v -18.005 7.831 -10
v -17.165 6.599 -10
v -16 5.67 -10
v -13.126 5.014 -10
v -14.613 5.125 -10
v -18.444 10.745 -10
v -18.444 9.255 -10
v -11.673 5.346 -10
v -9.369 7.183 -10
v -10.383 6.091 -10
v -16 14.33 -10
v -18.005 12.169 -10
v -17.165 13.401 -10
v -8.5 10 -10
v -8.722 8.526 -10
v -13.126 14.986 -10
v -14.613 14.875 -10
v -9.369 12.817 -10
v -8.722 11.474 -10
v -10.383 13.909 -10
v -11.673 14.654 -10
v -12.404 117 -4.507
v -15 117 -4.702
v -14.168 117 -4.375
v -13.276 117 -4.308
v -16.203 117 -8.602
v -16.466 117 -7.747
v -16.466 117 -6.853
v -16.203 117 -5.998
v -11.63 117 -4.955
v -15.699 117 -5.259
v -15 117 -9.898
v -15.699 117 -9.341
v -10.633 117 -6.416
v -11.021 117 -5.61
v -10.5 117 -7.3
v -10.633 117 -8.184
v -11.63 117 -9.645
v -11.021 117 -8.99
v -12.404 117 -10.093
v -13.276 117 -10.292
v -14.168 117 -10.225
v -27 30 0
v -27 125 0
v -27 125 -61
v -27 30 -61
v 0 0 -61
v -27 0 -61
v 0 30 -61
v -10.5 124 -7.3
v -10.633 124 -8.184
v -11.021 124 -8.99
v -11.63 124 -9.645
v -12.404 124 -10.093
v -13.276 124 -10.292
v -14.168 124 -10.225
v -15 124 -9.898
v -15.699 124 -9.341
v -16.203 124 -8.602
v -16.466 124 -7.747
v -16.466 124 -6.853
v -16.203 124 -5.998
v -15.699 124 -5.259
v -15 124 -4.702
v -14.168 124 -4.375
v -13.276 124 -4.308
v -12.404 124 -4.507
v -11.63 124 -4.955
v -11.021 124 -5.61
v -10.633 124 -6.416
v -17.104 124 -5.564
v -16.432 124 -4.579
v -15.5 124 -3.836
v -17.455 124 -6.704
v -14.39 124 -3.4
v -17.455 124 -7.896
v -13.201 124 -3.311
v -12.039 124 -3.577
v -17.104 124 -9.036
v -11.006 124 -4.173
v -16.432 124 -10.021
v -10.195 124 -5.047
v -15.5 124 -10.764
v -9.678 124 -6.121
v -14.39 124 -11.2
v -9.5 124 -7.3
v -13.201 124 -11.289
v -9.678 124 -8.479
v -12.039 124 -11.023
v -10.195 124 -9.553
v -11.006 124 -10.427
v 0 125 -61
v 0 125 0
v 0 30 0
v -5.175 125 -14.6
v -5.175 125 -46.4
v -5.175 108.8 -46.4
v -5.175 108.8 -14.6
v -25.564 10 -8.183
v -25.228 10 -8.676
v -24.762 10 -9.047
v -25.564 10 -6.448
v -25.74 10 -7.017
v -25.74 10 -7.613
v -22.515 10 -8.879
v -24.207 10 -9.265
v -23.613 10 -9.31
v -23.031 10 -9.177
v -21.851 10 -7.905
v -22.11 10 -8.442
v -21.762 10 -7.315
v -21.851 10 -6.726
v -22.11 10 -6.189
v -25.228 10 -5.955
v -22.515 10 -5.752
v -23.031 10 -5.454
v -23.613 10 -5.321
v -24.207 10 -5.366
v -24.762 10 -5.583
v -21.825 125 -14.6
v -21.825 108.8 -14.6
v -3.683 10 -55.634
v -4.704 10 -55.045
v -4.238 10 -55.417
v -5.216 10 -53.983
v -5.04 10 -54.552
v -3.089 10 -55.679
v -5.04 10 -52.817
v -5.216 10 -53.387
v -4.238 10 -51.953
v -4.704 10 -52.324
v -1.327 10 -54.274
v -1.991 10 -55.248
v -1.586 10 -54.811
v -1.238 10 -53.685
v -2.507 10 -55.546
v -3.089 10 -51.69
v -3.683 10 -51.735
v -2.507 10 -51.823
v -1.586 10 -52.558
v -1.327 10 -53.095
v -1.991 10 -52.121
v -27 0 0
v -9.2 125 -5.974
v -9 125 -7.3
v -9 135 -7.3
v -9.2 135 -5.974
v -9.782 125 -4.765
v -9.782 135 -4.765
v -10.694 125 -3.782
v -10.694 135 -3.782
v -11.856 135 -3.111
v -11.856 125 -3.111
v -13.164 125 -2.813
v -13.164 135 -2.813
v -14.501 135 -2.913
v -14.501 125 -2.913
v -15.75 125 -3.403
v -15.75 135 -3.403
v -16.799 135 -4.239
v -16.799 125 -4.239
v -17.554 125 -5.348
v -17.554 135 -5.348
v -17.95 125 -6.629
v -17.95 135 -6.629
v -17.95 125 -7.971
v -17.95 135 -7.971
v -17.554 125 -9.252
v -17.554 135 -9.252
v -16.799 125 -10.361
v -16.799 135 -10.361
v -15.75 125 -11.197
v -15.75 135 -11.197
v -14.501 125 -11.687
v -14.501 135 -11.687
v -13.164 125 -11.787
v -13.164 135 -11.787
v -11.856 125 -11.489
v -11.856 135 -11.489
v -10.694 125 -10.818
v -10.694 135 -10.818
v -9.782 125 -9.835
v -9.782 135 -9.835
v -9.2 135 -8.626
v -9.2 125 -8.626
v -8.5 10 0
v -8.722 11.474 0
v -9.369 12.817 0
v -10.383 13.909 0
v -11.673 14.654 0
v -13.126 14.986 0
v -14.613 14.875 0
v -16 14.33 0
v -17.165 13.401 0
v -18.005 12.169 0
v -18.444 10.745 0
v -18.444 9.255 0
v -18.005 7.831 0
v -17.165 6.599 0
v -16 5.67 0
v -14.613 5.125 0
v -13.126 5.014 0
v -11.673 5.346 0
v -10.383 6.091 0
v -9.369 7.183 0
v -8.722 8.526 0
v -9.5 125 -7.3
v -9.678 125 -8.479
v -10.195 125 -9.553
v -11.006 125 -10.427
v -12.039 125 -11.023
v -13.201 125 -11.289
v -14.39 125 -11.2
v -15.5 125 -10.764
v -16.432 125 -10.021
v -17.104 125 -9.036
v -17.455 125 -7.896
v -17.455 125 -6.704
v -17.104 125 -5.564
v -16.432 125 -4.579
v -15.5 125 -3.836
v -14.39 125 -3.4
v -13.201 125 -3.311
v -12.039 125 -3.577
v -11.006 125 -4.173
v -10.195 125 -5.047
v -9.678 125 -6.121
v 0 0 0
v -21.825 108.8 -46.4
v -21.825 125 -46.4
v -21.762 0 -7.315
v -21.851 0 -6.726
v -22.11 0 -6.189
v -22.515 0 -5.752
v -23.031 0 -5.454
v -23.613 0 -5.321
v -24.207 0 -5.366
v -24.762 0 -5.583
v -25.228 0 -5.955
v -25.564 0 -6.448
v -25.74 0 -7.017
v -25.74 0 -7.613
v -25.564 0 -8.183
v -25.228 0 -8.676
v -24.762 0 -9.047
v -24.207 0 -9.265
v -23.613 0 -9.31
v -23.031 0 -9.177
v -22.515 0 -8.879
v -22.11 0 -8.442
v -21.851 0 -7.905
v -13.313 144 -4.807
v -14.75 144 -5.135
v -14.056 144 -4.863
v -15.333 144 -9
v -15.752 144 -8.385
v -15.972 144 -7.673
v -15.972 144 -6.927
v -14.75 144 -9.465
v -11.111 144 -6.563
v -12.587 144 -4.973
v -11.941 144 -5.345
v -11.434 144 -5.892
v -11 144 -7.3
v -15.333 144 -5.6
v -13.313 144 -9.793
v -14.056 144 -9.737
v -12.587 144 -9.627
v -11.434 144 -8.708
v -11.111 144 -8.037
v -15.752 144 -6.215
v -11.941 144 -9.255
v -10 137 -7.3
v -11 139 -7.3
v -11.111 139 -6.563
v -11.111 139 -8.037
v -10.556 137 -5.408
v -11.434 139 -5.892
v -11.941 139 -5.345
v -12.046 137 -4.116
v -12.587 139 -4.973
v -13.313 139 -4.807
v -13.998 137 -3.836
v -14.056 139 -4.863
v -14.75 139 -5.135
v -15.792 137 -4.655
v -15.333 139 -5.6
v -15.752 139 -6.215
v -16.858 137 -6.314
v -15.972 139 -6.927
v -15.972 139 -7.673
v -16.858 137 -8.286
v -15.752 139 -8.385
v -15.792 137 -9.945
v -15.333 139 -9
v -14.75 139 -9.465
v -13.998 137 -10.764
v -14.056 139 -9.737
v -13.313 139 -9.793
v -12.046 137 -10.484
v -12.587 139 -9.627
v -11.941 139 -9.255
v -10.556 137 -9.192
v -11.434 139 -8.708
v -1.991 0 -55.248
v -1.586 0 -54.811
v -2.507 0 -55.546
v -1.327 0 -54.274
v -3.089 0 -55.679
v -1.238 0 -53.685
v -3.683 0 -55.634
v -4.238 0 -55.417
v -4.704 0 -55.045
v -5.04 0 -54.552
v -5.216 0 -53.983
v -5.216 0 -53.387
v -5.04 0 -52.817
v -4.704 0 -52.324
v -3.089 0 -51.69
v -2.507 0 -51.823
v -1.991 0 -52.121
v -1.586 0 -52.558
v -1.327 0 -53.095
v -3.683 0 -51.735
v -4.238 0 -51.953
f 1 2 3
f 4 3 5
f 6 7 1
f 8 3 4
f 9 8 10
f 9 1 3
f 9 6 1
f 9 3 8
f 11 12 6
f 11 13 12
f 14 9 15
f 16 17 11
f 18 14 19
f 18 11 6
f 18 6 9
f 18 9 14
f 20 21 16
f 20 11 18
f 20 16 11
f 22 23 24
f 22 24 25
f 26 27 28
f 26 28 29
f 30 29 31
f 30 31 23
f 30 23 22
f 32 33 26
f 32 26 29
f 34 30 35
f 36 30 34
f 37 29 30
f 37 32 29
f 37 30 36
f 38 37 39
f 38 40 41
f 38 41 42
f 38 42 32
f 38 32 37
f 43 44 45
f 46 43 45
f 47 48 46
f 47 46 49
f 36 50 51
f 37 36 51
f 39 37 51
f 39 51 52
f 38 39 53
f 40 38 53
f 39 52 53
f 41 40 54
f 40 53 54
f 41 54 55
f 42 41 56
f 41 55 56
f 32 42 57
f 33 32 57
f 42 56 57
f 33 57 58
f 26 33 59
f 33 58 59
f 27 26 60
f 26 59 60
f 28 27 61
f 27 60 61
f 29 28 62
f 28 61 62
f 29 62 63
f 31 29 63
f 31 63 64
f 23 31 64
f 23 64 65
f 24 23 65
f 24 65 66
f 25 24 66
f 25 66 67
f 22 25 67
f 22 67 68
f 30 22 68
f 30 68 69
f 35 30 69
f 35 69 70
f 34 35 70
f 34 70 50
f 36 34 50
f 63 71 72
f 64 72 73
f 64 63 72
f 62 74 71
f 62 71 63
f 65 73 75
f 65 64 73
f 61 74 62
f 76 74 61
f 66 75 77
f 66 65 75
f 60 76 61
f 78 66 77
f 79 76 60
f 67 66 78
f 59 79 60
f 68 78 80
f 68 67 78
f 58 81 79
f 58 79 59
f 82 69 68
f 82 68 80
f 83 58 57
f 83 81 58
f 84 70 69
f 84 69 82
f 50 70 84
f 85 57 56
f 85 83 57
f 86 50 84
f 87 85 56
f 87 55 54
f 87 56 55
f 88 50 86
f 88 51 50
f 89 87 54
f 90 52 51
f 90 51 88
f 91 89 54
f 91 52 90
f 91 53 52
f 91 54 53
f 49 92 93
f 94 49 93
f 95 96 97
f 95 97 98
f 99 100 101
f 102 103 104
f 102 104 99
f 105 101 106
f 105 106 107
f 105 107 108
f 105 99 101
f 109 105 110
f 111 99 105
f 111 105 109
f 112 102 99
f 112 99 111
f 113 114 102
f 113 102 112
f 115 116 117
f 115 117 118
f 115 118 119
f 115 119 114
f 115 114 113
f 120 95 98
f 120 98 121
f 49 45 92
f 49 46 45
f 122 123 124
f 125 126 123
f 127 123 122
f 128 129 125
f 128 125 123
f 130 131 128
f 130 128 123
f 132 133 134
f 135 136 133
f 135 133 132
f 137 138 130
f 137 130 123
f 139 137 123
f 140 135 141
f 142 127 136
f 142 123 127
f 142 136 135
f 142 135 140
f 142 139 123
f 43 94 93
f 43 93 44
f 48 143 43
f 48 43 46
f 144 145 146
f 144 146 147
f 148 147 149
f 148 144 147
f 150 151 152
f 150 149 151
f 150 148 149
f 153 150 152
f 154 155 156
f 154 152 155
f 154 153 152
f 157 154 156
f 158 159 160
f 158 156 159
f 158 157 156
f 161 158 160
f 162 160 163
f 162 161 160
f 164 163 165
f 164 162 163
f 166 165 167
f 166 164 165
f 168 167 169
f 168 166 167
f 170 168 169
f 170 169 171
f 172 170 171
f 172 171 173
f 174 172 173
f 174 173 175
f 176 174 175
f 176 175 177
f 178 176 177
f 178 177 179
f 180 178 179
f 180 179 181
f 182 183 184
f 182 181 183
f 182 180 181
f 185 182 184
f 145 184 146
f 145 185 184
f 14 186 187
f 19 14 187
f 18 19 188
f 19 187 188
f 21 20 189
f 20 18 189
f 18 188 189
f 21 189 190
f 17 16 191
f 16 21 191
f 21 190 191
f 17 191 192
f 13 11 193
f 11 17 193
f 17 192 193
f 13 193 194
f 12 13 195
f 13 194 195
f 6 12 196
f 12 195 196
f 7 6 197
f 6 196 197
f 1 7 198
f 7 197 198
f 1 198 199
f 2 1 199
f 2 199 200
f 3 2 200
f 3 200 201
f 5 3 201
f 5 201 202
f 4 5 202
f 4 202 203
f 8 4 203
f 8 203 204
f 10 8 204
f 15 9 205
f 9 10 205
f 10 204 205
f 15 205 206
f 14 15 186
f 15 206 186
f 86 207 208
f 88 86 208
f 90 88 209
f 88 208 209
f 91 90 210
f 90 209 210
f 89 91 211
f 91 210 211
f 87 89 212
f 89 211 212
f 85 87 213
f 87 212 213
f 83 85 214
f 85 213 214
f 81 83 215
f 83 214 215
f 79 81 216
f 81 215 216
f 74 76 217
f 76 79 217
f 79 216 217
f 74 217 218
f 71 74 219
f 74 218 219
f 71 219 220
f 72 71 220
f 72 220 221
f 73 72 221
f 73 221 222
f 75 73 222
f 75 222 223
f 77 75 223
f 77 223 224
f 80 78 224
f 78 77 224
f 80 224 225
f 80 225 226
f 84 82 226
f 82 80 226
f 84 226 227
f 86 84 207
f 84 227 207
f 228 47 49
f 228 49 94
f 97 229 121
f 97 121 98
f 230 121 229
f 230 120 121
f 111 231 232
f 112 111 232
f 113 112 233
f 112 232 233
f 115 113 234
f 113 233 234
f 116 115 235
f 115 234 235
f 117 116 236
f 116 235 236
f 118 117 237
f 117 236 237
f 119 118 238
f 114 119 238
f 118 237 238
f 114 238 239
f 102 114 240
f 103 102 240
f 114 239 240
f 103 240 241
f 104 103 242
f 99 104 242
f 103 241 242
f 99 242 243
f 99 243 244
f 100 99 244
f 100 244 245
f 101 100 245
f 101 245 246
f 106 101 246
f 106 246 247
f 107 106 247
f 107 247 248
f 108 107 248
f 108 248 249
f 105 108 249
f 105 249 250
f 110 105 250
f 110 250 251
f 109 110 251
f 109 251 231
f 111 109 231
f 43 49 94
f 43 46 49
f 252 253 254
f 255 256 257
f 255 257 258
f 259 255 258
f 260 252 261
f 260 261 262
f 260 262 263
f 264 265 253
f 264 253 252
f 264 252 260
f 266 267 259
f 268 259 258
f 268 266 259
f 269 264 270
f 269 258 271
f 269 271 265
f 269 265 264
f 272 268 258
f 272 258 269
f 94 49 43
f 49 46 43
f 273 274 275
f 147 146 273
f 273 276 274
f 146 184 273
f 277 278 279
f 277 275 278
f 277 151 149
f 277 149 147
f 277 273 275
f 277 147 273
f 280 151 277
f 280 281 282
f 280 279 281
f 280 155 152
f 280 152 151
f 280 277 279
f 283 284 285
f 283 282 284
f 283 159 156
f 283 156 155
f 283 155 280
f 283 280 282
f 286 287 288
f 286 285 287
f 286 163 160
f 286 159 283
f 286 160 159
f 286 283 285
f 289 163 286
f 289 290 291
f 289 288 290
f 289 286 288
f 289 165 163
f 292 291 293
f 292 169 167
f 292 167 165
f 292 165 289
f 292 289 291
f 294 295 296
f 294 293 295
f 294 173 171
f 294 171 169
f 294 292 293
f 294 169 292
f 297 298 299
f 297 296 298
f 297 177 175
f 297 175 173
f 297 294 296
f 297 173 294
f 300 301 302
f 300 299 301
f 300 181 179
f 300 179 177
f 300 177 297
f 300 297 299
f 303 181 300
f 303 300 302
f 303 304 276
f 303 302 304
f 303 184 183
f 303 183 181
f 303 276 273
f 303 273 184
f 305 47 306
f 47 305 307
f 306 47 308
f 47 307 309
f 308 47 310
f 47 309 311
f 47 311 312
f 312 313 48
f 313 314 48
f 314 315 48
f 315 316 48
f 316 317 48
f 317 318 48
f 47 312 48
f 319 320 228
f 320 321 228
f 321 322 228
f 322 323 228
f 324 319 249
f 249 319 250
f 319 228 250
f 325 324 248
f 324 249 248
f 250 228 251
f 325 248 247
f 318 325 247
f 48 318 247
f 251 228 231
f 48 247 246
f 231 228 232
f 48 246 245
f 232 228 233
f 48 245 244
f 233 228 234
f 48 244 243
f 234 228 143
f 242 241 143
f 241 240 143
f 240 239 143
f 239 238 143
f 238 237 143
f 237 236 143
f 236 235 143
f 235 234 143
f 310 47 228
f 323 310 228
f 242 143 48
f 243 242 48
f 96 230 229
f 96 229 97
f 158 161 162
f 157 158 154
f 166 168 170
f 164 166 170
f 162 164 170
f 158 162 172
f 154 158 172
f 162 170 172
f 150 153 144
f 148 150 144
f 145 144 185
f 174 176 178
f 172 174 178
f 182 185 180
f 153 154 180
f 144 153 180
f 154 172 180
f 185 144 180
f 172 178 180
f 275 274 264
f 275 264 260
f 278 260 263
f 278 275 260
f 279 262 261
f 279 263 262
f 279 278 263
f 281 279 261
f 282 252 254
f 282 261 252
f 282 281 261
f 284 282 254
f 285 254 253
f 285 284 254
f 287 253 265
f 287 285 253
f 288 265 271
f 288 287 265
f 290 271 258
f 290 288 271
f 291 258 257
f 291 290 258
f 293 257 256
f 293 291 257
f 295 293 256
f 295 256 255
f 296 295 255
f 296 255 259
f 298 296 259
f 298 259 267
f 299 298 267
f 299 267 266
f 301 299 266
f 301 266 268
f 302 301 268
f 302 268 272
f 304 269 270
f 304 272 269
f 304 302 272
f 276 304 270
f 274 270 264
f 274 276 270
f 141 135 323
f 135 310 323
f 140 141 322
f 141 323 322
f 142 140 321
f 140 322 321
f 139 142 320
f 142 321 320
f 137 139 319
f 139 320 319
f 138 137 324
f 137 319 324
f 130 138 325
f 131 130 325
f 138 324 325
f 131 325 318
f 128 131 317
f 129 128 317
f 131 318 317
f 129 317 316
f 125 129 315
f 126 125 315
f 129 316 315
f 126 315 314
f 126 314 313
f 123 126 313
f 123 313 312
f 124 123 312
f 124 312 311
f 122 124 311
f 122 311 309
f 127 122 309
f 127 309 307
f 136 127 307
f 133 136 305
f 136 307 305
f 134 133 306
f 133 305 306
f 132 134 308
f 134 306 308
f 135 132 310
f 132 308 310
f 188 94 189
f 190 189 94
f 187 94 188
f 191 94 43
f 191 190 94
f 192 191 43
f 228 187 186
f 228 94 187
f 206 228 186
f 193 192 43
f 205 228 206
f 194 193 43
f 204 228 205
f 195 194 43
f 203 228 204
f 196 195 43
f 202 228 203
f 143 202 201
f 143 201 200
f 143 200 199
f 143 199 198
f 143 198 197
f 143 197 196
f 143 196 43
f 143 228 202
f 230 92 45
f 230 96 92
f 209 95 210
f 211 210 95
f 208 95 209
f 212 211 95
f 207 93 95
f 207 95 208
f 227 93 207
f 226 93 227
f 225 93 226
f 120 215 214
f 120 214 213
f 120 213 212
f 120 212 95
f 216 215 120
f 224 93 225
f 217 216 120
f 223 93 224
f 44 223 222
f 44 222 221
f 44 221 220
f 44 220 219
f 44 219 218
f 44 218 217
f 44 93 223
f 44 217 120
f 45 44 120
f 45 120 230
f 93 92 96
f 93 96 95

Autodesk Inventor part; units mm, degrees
ref_plane "YZ Plane" through (0, 0, 0) normal (1, 0, 0) x (0, 1, 0)
ref_plane "XZ Plane" through (0, 0, 0) normal (0, 1, 0) x (-1, 0, 0)
sketch "Sketch1" plane through (0, 0, 0) normal (0, 1, 0) x (-1, 0, 0)
  line L0 (0, 0) -> (27, 0)
  line L1 (27, 0) -> (27, -61)
  line L2 (27, -61) -> (0, -61)
  line L3 (0, -61) -> (0, 0)
  dimension "d0" = 27
  dimension "d1" = 61
extrude "Extrusion1" add sketch "Sketch1" along normal blind 125
sketch "Sketch2" plane through (0, 0, 0) normal (1, 0, 0) x (0, 0, -1)
  line L0 (61, 0) -> (0, 0) projected
  line L1 (61, 0) -> (61, 125) projected
  line L2 (0, 0) -> (61, 0)
  line L3 (61, 0) -> (61, 30)
  line L4 (61, 30) -> (0, 30)
  line L5 (0, 30) -> (0, 0)
  dimension "d4" = 30
split body "Split1" sketch "Sketch2" result two bodies curves L4 L5 L2 L3 first body at (-0.5, 10, -20.3333)
sketch "Sketch3" plane through (0, 0, 0) normal (0, -1, 0) x (1, 0, 0)
  line L0 (-27, 0) -> (0, 0) projected
  line L1 (-27, -61) -> (-27, 0) projected
  line L2 (0, 0) -> (-27, -61)
  line L3 (-27, -61) -> (-22.9525, -51.8557)
  line L4 (0, 0) -> (-4.0475, -9.1443)
  circle A0 centre (-4.0475, -9.1443) radius 2
  circle A1 centre (-22.9525, -51.8557) radius 2
  line L5 (0, -61) -> (-27, -61) projected
  line L6 (-27, 0) -> (0, -61)
  line L7 (0, -61) -> (-3.238, -53.6846)
  line L8 (-27, 0) -> (-23.762, -7.3154)
  circle A2 centre (-23.762, -7.3154) radius 2
  circle A3 centre (-3.238, -53.6846) radius 2
  dimension "d5" = 10
  dimension "d6" = 10
  dimension "d7" = 4
  dimension "d8" = 4
  dimension "d14" = 8
  dimension "d15" = 8
  dimension "d16" = 4
extrude "Extrusion2" cut sketch "Sketch3" against normal blind 10 contours A2 L6 | L6 A2 | A3 L6 | L6 A3 bodies 2
sketch "Sketch4" plane through (-27, 0, 0) normal (0, 0, 1) x (1, 0, 0)
  line L0 (0, 0) -> (0, 30) projected
  line L1 (0, 0) -> (13.5, 0)
  line L2 (0, 0) -> (27, 0) projected
  line L3 (13.5, 0) -> (13.5, 10)
  circle A0 centre (13.5, 10) radius 5
  dimension "d11" = 10
extrude "Extrusion3" cut sketch "Sketch4" against normal blind 10 bodies 2
sketch "Sketch12" plane through (0, 125, 0) normal (1, 0, 0) x (0, 0, -1)
  line L0 (0.5745, -8.0578) -> (59.8412, -8.0578) construction
  line L1 (59.8412, -8.0578) -> (59.8412, -95.0528) construction
  line L2 (59.8412, -95.0528) -> (0.5745, -95.0528) construction
  line L3 (0.5745, -95.0528) -> (0.5745, -8.0578) construction
  point P0 (0, -125)
decal "Decal2"
sketch "Sketch13" plane through (0, 125, 0) normal (0, 1, 0) x (1, 0, 0)
  line L0 (-27, 0) -> (0, 0) projected
  line L1 (0, 0) -> (-13.5, 0)
  line L2 (-13.5, 0) -> (-13.5, 30.5)
  line L3 (0, 61) -> (-27, 61) projected
  line L4 (-21.825, 46.4) -> (-5.175, 46.4)
  line L5 (-5.175, 46.4) -> (-5.175, 14.6)
  line L6 (-5.175, 14.6) -> (-21.825, 14.6)
  line L7 (-21.825, 14.6) -> (-21.825, 46.4)
  line L8 (-21.825, 46.4) -> (-5.175, 14.6) construction
  line L9 (-5.175, 46.4) -> (-21.825, 14.6) construction
  dimension "d39" = 30.5
  dimension "d40" = 16.65
  dimension "d41" = 31.8
extrude "Extrusion4" cut sketch "Sketch13" against normal blind 16.2 bodies 3
sketch "Sketch14" plane through (0, 125, 0) normal (0, 1, 0) x (1, 0, 0)
  line L0 (-5.175, 14.6) -> (-21.825, 14.6) projected
  line L1 (-13.5, 14.6) -> (-13.5, 7.3)
  line L2 (-27, 0) -> (0, 0) projected
  circle A0 centre (-13.5, 7.3) radius 4
  dimension "d44" = 7.3
  dimension "d45" = 8
extrude "Extrusion5" cut sketch "Sketch14" against normal blind 1 bodies 3
sketch "Sketch15" plane through (-13.5, 124, -7.3) normal (0, 1, 0) x (1, 0, 0)
  circle A0 centre (0, 0) radius 3
  point P0 (13.5, -7.3)
  dimension "d48" = 6
extrude "Extrusion6" cut sketch "Sketch15" against normal blind 7 bodies 3
sketch "Sketch16" plane through (0, 125, 0) normal (0, 1, 0) x (1, 0, 0)
  circle A0 centre (-13.5, 7.3) radius 4 projected
  circle A1 centre (-13.5, 7.3) radius 3 projected
  circle A2 centre (-13.5, 7.3) radius 4.5
  point P0 (0, 0)
  dimension "d51" = 9
extrude "Extrusion7" add sketch "Sketch16" along normal blind 10 separate body contours A0 | A1 | A2
ref_plane "Work Plane4" through (-13.5, 139, -7.3) normal (0, 1, 0) x (1, 0, 0)
sketch "Sketch17" plane through (-13.5, 139, -7.3) normal (0, 1, 0) x (1, 0, 0)
  circle A0 centre (0, 0) radius 2.5
  point P0 (13.5, -7.3)
  dimension "d55" = 5
extrude "Extrusion8" add sketch "Sketch17" along normal blind 5 separate body
loft "Loft1" add bodies 4 section 1 edges at (-18, 135, -7.3) section 2 edges at (-16, 139, -7.3)
combine bodies "Combine1" operation type add bodies to combine 5 4
sketch "Sketch18" plane through (-13.5, 144, -7.3) normal (0, 1, 0) x (1, 0, 0)
  circle A0 centre (0, 0) radius 2.5 projected
sketch "Sketch19" plane through (-27, 125, -61) normal (-1, 0, 0) x (0, 0, 1)
  line L0 (0.9673, -7.4353) -> (60.234, -7.4353) construction
  line L1 (60.234, -7.4353) -> (60.234, -94.4303) construction
  line L2 (60.234, -94.4303) -> (0.9673, -94.4303) construction
  line L3 (0.9673, -94.4303) -> (0.9673, -7.4353) construction
  point P0 (61, -125)
  point P1 (-0.9513, -94.5214)
decal "Decal3"
properties part number "alicat_presion"
